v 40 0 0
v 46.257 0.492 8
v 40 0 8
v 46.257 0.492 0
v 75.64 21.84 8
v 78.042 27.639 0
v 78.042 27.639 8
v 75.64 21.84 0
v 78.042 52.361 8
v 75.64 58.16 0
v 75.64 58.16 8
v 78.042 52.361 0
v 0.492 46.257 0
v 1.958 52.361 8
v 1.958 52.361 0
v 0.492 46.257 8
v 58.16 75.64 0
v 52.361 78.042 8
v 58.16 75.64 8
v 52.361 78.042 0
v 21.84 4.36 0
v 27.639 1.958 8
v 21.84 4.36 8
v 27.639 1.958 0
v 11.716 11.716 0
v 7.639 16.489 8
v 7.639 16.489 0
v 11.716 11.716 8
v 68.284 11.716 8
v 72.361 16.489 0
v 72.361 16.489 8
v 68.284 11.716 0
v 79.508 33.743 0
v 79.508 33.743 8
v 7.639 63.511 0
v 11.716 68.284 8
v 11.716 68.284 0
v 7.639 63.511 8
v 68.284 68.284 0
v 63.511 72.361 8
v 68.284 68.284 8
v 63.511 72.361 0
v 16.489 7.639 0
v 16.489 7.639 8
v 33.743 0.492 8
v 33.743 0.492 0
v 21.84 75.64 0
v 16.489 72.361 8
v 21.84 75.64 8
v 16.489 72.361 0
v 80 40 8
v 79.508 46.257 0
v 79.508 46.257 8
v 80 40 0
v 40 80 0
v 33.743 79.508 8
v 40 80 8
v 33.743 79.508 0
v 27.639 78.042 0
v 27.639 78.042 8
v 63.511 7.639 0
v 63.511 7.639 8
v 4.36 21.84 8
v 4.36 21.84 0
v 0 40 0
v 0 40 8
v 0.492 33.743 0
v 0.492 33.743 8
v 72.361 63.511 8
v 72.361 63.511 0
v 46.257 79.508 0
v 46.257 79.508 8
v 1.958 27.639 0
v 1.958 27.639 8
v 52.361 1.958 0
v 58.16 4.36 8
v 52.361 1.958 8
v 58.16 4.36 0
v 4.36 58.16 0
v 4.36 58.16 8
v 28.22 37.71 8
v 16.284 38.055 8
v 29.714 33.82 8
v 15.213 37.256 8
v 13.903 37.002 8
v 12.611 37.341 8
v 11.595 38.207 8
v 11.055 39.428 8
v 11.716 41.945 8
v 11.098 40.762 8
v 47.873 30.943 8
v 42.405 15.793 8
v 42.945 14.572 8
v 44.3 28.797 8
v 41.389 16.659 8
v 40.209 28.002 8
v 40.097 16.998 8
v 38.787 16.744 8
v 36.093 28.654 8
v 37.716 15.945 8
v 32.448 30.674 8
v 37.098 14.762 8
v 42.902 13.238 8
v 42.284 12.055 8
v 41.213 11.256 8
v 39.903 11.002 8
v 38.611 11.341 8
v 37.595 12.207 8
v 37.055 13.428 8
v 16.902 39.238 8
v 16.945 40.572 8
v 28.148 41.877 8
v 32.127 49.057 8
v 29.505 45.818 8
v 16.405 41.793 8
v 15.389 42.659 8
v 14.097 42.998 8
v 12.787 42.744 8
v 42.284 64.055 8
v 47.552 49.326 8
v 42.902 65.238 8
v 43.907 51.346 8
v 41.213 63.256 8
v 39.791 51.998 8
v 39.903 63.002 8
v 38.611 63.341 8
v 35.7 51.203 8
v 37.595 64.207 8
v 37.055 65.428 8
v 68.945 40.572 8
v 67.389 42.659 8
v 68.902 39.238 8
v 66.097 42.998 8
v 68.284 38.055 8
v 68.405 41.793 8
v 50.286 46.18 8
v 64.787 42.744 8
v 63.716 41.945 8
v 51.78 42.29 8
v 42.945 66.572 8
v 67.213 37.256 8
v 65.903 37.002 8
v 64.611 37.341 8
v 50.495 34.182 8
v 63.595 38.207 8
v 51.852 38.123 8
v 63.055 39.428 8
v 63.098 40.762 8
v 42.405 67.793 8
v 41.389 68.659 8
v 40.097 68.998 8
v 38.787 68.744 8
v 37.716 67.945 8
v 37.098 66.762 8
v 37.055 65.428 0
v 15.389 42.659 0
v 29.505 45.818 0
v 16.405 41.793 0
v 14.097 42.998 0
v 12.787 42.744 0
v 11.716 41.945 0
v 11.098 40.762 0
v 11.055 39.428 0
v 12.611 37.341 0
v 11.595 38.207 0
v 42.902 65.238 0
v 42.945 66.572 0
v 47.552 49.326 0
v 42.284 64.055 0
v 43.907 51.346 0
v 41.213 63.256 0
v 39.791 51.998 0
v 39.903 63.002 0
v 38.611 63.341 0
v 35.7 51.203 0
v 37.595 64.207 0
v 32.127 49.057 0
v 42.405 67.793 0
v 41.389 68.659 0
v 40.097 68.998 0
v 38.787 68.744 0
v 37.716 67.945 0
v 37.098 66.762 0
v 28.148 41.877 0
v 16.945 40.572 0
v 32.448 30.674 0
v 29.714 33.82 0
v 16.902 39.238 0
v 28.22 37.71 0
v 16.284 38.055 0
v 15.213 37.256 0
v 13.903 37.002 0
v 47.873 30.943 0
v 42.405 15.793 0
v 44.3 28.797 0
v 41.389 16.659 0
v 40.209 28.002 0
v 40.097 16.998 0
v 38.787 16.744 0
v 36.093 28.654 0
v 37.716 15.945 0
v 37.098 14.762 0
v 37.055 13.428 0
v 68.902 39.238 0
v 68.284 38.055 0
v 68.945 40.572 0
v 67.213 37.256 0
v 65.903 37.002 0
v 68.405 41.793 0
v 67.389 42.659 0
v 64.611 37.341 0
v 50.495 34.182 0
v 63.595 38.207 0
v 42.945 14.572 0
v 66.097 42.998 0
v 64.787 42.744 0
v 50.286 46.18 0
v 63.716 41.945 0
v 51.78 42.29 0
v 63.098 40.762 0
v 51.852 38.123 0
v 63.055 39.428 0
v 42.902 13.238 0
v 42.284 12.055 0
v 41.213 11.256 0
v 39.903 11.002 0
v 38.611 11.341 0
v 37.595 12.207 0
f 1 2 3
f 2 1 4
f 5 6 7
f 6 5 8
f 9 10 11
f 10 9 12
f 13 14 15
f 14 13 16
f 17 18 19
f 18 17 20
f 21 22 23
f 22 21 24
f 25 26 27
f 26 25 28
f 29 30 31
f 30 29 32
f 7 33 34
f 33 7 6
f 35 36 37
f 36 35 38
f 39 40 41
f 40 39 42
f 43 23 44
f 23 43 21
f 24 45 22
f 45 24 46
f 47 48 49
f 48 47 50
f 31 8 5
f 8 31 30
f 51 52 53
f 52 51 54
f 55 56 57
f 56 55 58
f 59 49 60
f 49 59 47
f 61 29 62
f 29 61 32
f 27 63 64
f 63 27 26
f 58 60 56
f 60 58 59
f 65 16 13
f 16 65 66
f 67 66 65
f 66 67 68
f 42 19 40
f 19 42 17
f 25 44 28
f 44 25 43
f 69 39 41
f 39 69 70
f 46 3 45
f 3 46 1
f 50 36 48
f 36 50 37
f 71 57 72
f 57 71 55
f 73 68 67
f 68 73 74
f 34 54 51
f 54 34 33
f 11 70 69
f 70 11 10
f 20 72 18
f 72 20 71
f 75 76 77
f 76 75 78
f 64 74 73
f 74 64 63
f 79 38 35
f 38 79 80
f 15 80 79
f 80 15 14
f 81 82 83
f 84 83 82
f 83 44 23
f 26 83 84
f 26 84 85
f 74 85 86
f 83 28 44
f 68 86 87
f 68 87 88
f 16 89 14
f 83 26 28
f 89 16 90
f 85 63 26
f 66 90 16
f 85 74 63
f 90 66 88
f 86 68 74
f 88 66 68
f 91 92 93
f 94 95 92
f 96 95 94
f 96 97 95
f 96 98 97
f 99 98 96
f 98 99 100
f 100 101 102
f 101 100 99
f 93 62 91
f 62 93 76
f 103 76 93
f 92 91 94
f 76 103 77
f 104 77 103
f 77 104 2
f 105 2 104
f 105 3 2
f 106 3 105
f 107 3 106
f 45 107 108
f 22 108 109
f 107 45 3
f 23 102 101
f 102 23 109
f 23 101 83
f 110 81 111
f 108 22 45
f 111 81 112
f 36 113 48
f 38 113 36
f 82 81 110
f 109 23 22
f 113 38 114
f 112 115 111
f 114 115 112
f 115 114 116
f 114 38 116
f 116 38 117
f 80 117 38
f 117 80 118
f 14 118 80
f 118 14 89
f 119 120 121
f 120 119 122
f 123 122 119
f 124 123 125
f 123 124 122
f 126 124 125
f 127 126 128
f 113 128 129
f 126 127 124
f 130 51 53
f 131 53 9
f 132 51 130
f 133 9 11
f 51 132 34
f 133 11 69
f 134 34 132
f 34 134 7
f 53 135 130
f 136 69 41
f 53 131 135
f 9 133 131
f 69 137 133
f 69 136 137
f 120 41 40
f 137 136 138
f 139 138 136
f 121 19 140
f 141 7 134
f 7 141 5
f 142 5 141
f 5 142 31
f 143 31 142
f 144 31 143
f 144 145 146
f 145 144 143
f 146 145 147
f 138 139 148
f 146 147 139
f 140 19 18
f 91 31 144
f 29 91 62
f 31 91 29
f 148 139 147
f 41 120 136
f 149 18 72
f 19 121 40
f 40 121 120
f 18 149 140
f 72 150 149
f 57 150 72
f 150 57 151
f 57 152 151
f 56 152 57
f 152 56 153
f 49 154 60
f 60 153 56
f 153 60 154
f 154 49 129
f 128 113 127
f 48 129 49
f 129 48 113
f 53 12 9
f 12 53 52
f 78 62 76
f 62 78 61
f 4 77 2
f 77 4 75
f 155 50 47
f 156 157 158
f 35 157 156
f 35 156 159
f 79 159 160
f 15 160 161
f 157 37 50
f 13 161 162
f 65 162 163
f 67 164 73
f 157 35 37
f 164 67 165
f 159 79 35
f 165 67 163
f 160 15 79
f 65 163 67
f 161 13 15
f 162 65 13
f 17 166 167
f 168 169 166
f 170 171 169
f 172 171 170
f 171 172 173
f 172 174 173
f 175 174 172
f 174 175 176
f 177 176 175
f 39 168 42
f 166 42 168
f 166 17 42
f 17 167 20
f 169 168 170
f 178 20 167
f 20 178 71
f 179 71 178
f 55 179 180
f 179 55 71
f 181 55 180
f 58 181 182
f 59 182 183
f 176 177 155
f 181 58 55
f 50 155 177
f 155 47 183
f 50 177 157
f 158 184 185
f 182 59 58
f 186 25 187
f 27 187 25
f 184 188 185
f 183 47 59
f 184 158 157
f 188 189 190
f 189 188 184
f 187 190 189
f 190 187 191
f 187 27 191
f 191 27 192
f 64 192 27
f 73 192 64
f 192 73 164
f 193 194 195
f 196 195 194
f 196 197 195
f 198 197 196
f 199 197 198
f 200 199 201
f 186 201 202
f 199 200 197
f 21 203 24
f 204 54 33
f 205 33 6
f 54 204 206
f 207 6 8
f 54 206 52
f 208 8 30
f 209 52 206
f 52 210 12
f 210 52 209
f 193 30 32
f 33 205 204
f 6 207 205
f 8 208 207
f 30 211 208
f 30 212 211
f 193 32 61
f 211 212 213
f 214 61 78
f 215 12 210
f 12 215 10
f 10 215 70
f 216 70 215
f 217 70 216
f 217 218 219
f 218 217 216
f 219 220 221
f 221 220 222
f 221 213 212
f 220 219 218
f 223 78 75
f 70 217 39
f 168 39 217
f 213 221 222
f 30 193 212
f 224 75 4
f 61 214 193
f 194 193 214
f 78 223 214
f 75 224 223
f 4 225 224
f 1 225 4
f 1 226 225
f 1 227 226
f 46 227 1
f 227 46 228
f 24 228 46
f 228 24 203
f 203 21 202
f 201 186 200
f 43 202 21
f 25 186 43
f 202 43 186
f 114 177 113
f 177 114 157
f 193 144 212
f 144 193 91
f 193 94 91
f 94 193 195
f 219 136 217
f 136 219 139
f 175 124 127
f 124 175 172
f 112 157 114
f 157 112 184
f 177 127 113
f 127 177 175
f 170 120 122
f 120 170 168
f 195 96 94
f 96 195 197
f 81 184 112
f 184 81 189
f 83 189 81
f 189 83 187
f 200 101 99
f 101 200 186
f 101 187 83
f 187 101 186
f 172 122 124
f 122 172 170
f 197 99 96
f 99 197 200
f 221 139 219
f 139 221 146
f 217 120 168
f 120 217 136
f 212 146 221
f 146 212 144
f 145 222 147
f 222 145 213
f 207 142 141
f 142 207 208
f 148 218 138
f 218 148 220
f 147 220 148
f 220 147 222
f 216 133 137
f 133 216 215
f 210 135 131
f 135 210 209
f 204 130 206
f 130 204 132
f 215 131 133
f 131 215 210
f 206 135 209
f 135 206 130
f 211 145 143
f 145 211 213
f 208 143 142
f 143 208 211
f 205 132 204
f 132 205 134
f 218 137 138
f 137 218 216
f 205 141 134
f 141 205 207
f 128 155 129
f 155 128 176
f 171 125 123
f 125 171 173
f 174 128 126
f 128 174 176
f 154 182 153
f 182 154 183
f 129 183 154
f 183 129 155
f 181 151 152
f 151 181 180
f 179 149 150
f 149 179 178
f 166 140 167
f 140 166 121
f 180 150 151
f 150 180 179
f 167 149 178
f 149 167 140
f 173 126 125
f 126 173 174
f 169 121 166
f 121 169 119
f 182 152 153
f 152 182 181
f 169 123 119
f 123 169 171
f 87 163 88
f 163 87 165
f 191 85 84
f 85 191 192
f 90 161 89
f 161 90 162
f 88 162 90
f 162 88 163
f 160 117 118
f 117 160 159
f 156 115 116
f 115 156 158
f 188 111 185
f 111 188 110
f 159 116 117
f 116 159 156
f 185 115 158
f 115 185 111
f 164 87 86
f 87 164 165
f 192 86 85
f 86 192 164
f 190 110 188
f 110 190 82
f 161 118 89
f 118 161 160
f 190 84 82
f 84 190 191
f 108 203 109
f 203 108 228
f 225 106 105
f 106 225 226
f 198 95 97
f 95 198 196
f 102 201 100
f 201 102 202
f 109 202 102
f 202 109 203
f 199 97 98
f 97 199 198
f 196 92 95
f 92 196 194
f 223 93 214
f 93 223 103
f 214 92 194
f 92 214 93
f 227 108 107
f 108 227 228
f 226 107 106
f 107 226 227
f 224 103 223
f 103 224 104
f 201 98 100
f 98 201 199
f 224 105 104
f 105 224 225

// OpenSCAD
$fn = 32;

// ----------------------------------------------------------------------
// Spacer plate: round flange R40, 4 bolts
// ----------------------------------------------------------------------

// --- parameters (mm) ---
bore_r = 12;              // centre bore radius
bolt_r = 3;               // bolt hole radius
plate_t = 8;              // plate thickness, Z (extrusion height)
flange_r = 40;            // flange radius
n_bolt = 4;               // bolt hole count
ring_r = 26;              // bolt circle radius
fit_tol = 0.05;           // declared fit tolerance (prompt contract)
free_tol = 0.2;           // declared free tolerance (prompt contract)

profile = [[80, 40], [79.508, 46.257], [78.042, 52.361], [75.64, 58.16], [72.361, 63.511], [68.284, 68.284], [63.511, 72.361], [58.16, 75.64], [52.361, 78.042], [46.257, 79.508], [40, 80], [33.743, 79.508], [27.639, 78.042], [21.84, 75.64], [16.489, 72.361], [11.716, 68.284], [7.639, 63.511], [4.36, 58.16], [1.958, 52.361], [0.492, 46.257], [0, 40], [0.492, 33.743], [1.958, 27.639], [4.36, 21.84], [7.639, 16.489], [11.716, 11.716], [16.489, 7.639], [21.84, 4.36], [27.639, 1.958], [33.743, 0.492], [40, 0], [46.257, 0.492], [52.361, 1.958], [58.16, 4.36], [63.511, 7.639], [68.284, 11.716], [72.361, 16.489], [75.64, 21.84], [78.042, 27.639], [79.508, 33.743]];  // primary outline, 40 points, counter clockwise
void_1 = [[51.78, 42.29], [50.286, 46.18], [47.552, 49.326], [43.907, 51.346], [39.791, 51.998], [35.7, 51.203], [32.127, 49.057], [29.505, 45.818], [28.148, 41.877], [28.22, 37.71], [29.714, 33.82], [32.448, 30.674], [36.093, 28.654], [40.209, 28.002], [44.3, 28.797], [47.873, 30.943], [50.495, 34.182], [51.852, 38.123]];  // centre bore, 18 points
void_2 = [[68.945, 40.572], [68.405, 41.793], [67.389, 42.659], [66.097, 42.998], [64.787, 42.744], [63.716, 41.945], [63.098, 40.762], [63.055, 39.428], [63.595, 38.207], [64.611, 37.341], [65.903, 37.002], [67.213, 37.256], [68.284, 38.055], [68.902, 39.238]];  // bolt hole 1, 14 points
void_3 = [[42.945, 66.572], [42.405, 67.793], [41.389, 68.659], [40.097, 68.998], [38.787, 68.744], [37.716, 67.945], [37.098, 66.762], [37.055, 65.428], [37.595, 64.207], [38.611, 63.341], [39.903, 63.002], [41.213, 63.256], [42.284, 64.055], [42.902, 65.238]];  // bolt hole 2, 14 points
void_4 = [[16.945, 40.572], [16.405, 41.793], [15.389, 42.659], [14.097, 42.998], [12.787, 42.744], [11.716, 41.945], [11.098, 40.762], [11.055, 39.428], [11.595, 38.207], [12.611, 37.341], [13.903, 37.002], [15.213, 37.256], [16.284, 38.055], [16.902, 39.238]];  // bolt hole 3, 14 points
void_5 = [[42.945, 14.572], [42.405, 15.793], [41.389, 16.659], [40.097, 16.998], [38.787, 16.744], [37.716, 15.945], [37.098, 14.762], [37.055, 13.428], [37.595, 12.207], [38.611, 11.341], [39.903, 11.002], [41.213, 11.256], [42.284, 12.055], [42.902, 13.238]];  // bolt hole 4, 14 points

// --- the one profile operation ---
difference() {
  linear_extrude(height = plate_t) polygon(points = profile);
  translate([0, 0, -1])
    linear_extrude(height = plate_t + 2) polygon(points = void_1);
  translate([0, 0, -1])
    linear_extrude(height = plate_t + 2) polygon(points = void_2);
  translate([0, 0, -1])
    linear_extrude(height = plate_t + 2) polygon(points = void_3);
  translate([0, 0, -1])
    linear_extrude(height = plate_t + 2) polygon(points = void_4);
  translate([0, 0, -1])
    linear_extrude(height = plate_t + 2) polygon(points = void_5);
}
